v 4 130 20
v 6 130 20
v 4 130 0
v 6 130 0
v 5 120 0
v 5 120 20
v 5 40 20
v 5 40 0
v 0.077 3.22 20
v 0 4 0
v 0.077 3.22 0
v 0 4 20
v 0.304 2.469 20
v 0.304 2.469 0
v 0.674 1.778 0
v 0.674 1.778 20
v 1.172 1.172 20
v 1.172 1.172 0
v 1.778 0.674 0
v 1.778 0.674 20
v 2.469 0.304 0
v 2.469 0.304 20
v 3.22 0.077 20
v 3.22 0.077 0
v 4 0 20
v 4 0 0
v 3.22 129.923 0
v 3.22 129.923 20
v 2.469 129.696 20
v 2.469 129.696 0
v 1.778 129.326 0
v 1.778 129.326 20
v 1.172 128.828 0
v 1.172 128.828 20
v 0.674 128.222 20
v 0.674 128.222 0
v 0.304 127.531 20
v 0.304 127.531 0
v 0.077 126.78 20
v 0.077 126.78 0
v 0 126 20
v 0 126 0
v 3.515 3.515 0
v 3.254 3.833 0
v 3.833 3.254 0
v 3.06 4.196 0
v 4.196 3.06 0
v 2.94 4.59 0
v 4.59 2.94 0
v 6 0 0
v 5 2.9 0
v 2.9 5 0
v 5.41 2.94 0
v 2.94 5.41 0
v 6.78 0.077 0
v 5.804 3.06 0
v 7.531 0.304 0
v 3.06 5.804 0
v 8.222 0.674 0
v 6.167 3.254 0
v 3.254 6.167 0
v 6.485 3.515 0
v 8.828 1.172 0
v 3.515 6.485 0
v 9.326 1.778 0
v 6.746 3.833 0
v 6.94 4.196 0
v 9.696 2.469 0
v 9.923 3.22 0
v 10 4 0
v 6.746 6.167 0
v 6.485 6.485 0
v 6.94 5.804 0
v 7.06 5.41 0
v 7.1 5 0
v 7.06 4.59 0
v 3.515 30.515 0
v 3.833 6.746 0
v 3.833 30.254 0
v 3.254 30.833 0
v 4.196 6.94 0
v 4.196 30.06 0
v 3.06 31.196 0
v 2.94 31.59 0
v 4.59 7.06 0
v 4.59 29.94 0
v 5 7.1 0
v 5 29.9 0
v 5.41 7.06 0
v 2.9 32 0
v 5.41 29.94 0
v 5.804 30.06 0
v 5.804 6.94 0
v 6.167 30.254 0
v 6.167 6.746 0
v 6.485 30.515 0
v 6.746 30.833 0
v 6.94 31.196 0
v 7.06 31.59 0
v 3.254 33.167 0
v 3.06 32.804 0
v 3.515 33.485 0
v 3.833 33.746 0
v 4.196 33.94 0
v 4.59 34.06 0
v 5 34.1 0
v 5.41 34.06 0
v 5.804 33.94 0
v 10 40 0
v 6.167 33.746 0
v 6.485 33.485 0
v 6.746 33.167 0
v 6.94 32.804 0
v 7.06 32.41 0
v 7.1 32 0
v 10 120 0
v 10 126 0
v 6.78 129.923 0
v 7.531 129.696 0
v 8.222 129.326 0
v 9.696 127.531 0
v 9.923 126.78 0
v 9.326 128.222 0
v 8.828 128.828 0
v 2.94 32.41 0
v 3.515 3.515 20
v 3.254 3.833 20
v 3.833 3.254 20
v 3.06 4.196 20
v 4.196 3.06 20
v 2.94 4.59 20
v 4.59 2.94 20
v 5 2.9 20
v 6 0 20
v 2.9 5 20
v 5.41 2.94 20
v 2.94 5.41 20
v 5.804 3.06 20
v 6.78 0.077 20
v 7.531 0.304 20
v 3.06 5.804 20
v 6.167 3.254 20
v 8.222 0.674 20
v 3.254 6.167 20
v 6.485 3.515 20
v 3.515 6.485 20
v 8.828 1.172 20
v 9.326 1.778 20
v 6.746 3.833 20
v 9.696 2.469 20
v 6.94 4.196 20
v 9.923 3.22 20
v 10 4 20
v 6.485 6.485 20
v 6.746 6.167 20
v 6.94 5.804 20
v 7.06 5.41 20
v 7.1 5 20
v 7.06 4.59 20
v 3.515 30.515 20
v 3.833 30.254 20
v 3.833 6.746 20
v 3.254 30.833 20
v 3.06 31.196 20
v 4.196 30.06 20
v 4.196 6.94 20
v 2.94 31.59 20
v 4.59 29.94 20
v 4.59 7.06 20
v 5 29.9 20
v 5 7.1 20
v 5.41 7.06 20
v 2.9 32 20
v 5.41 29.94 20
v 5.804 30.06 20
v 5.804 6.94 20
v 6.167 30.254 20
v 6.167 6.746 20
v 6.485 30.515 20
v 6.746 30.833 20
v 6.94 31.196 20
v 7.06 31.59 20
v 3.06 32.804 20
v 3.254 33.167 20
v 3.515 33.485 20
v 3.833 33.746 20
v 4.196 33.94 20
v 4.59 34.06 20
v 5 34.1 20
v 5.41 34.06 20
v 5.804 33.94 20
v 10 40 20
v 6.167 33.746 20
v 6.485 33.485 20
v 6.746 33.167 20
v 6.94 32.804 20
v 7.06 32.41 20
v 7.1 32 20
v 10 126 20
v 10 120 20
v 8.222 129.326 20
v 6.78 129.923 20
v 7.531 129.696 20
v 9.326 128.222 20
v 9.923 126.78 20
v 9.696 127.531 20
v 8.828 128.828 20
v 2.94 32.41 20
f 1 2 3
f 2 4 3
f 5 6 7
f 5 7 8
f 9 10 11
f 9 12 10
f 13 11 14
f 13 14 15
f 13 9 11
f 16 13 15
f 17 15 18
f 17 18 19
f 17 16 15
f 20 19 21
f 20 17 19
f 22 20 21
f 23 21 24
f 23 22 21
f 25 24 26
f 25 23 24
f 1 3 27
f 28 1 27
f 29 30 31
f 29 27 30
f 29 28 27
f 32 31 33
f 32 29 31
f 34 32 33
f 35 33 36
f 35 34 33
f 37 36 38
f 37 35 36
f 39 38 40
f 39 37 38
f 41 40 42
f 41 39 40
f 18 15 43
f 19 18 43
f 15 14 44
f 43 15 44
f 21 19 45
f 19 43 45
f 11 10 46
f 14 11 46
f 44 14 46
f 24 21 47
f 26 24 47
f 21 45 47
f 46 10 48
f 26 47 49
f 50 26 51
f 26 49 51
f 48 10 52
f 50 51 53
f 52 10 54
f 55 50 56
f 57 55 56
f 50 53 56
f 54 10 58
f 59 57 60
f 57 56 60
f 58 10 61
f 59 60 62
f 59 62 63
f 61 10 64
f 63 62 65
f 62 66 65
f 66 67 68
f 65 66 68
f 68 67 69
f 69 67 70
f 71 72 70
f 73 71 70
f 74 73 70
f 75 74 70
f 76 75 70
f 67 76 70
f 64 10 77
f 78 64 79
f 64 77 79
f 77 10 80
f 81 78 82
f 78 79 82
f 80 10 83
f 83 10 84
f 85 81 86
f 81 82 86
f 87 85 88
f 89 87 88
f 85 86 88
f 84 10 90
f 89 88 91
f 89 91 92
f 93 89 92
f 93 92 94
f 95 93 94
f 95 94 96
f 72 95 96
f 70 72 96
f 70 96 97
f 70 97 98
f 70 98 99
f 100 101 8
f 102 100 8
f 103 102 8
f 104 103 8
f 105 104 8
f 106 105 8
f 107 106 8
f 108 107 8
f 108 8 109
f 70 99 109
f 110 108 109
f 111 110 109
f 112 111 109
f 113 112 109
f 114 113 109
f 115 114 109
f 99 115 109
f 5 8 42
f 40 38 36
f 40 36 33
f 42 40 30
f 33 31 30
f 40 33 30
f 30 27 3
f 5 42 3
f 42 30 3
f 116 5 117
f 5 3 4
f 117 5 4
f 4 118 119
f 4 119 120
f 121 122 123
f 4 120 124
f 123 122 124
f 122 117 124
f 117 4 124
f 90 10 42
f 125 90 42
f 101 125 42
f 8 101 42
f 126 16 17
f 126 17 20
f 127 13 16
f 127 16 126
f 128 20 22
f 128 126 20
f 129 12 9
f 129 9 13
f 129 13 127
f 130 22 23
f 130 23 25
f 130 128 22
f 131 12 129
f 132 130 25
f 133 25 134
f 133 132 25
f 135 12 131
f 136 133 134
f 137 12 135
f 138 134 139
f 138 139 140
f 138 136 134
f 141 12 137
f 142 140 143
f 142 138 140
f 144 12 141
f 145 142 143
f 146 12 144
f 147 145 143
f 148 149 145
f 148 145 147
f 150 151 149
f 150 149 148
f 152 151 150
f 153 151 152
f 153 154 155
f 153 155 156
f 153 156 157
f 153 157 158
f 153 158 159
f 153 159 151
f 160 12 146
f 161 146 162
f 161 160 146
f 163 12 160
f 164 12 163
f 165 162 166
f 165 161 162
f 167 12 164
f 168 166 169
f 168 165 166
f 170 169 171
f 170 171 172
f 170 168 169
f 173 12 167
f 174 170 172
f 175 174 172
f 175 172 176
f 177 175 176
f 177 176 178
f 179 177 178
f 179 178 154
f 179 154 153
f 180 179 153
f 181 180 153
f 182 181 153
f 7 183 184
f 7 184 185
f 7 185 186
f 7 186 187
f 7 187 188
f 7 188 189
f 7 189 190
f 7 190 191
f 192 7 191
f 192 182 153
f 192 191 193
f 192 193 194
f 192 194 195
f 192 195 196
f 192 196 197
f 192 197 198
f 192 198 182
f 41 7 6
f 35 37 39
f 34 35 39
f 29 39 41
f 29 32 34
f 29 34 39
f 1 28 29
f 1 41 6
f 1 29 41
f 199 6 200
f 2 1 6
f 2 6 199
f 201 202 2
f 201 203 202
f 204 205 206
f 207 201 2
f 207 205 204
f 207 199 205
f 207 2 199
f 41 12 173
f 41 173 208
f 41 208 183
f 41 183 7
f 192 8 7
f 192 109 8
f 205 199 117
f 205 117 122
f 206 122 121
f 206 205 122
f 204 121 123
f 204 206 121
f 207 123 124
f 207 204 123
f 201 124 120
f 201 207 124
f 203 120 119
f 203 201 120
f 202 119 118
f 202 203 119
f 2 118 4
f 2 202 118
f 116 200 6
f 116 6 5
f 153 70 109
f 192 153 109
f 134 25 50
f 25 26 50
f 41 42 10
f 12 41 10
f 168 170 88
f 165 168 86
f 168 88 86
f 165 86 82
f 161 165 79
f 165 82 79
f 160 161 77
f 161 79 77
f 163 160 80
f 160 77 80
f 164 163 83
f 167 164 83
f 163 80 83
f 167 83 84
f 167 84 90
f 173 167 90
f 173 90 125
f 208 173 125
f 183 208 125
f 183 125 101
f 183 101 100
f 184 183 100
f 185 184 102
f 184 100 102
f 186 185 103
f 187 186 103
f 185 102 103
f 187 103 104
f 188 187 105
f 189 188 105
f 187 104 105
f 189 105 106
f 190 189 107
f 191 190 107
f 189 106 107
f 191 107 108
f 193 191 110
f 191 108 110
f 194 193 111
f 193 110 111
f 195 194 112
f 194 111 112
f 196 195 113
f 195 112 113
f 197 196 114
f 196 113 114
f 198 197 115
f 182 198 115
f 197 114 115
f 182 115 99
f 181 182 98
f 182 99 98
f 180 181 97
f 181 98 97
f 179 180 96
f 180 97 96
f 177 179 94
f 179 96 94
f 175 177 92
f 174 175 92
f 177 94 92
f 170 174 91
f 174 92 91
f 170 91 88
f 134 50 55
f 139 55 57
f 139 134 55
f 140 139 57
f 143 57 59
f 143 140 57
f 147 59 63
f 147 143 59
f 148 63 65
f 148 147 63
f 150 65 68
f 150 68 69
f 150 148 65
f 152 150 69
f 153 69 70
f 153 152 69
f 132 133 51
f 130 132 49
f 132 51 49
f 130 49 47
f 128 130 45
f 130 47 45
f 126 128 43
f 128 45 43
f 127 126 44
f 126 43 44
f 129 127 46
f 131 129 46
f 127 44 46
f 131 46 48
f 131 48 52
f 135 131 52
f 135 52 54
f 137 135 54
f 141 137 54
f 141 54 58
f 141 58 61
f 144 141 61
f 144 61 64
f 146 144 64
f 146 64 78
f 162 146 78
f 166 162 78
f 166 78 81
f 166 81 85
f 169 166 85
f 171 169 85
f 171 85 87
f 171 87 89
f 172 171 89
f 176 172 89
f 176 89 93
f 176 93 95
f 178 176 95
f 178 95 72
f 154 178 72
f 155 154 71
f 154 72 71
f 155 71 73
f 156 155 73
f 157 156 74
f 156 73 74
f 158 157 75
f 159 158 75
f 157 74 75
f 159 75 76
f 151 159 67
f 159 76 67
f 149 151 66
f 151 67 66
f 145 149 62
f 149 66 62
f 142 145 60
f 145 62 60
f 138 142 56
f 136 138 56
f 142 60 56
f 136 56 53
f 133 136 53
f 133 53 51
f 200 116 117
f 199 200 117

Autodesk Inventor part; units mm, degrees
ref_plane "YZ Plane" through (0, 0, 0) normal (1, 0, 0) x (0, 1, 0)
ref_plane "XZ Plane" through (0, 0, 0) normal (0, 1, 0) x (-1, 0, 0)
ref_plane "XY Plane" through (0, 0, 0) normal (0, 0, 1) x (1, 0, 0)
sketch "スケッチ1" plane through (0, 0, 0) normal (0, 0, 1) x (1, 0, 0)
  line L0 (0, 0) -> (10, 0)
  line L1 (10, 0) -> (10, 130)
  line L2 (10, 130) -> (0, 130)
  line L3 (0, 130) -> (0, 0)
  dimension "d0" = 10
  dimension "d1" = 130
extrude "押し出し1" add sketch "スケッチ1" along normal blind 20
sketch "スケッチ2" plane through (0, 0, 20) normal (0, 0, 1) x (1, 0, 0)
  line L0 (10, 130) -> (0, 130) projected
  line L1 (5, 130) -> (5, 0) construction
  line L2 (0, 0) -> (10, 0) projected
  point P0 (5, 5)
  point P1 (5, 32)
  dimension "d4" = 27
  dimension "d5" = 5
hole "穴1" at (5, 5, 20) at (5, 32, 20) direction (0, 0, -1) diameter 4.2 depth 20
sketch "スケッチ3" plane through (10, 0, 0) normal (1, 0, 0) x (0, 0, -1)
  line L0 (-20, 0) -> (-20, 130) projected
  line L1 (0, 0) -> (0, 130) projected
  line L2 (-20, 120) -> (0, 120)
  line L3 (0, 120) -> (0, 40)
  line L4 (0, 40) -> (-20, 40)
  line L5 (-20, 40) -> (-20, 120)
  line L6 (0, 130) -> (-20, 130) projected
  point P0 (-10, 120)
  point P1 (-20, 40)
  point P2 (0, 120)
  dimension "d13" = 10
  dimension "d14" = 80
extrude "押し出し2" cut sketch "スケッチ3" against normal blind 5 contours L0 L2 L1 L4
fillet "フィレット1" radius 4 4 edges at (10, 0, 10) (0, 0, 10) (10, 130, 10) (0, 130, 10)
properties part number "finger1" material "アセタール樹脂、白"
